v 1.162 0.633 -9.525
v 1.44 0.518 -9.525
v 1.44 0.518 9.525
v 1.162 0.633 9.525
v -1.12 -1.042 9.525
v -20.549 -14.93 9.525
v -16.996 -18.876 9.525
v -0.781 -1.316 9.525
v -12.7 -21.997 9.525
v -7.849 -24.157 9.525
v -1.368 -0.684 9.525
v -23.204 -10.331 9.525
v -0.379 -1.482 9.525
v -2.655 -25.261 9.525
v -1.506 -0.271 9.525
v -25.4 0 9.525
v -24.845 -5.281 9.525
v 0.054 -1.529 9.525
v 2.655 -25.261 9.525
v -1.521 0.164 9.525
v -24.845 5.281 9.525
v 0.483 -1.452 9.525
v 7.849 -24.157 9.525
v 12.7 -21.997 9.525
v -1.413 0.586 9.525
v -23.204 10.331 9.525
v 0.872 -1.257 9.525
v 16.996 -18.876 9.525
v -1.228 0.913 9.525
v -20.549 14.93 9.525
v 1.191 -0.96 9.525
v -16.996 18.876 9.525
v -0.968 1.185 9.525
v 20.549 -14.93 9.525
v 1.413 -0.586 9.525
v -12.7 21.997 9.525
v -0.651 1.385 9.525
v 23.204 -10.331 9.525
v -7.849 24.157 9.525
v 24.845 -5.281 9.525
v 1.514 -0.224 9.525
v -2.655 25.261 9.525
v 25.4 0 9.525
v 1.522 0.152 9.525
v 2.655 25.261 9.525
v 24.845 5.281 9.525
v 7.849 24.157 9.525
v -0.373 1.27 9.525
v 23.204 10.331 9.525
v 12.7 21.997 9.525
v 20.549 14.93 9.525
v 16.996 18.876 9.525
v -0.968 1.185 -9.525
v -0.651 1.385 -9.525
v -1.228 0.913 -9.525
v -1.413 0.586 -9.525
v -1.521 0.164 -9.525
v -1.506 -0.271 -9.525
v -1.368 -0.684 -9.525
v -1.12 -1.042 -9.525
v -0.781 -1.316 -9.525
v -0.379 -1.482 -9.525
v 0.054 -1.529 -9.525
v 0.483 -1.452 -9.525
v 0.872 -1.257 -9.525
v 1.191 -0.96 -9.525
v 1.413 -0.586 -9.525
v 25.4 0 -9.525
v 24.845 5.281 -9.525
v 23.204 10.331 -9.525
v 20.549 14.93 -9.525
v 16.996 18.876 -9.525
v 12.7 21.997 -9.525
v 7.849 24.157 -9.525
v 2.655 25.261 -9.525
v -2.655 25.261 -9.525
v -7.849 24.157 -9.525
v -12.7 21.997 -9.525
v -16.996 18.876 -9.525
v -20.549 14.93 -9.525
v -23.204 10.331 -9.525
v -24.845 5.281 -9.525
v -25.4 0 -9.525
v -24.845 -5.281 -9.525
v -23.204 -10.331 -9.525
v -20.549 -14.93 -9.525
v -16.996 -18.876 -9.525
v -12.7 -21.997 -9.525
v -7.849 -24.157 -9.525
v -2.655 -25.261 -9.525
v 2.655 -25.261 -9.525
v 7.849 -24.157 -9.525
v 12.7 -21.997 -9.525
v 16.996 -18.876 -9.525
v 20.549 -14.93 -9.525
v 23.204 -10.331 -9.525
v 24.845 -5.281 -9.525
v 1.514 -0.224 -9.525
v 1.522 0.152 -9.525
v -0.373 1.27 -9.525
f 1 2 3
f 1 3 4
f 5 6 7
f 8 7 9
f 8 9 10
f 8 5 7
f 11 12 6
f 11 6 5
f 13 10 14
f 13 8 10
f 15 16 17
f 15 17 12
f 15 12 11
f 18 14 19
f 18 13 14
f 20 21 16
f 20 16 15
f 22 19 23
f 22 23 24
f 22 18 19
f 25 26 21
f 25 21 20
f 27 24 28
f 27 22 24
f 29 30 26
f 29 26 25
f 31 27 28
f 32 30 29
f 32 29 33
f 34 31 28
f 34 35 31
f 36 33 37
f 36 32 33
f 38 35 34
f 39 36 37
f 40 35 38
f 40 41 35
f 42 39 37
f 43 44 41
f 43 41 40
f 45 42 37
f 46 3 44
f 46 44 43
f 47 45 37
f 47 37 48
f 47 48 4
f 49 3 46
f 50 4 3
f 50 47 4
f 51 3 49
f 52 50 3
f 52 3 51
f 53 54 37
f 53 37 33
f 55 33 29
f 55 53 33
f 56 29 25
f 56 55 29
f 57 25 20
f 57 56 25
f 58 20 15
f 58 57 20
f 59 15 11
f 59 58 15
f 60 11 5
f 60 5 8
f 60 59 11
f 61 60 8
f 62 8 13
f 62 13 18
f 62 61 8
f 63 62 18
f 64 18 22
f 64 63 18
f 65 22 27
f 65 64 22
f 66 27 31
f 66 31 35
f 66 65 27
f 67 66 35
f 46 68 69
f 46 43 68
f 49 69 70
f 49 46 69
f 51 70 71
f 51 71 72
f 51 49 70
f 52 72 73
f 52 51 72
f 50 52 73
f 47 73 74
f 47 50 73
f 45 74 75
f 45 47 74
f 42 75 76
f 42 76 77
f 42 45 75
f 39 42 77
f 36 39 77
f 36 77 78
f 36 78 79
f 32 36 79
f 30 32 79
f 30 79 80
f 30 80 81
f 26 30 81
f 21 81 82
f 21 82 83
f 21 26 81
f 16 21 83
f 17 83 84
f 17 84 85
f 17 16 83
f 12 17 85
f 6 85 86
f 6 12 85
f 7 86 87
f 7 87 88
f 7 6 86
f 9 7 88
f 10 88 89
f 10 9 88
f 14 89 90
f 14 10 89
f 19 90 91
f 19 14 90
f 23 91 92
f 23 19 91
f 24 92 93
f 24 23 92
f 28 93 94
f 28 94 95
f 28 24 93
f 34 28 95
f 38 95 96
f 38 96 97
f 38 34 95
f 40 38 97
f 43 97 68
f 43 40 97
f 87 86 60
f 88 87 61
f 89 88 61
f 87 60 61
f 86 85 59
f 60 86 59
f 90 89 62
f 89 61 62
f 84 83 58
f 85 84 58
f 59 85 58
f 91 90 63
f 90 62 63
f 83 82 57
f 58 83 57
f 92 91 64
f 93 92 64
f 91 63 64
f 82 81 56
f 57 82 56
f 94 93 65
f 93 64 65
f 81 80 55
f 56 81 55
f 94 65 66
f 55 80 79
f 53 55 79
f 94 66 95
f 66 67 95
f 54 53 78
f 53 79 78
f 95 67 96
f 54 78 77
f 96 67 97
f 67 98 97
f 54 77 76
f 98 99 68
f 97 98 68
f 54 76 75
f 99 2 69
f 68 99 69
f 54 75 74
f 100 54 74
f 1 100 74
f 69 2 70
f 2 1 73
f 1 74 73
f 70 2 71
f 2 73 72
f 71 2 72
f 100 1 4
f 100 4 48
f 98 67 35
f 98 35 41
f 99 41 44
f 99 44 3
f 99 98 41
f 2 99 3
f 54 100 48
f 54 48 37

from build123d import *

# Parameters (mm, degrees)
SKETCH1_R           = 25.4
BOSS_EXTRUDE1_DEPTH = 9.525


with BuildPart() as part:
    # Sketch1 → Boss-Extrude1 (new, symmetric)
    with BuildSketch(Plane.XY):
        Circle(SKETCH1_R)
        with BuildLine():
            Line((1.439619435, 0.51806938), (1.161846601, 0.633255459))
            Line((1.161846601, 0.633255459), (-0.372765644, 1.269624265))
            Line((-0.372765644, 1.269624265), (-0.650538478, 1.384810344))
            ThreePointArc((-0.650538478, 1.384810344), (-1.106507953, 1.056664634), (-1.413303873, 0.586064982))
            ThreePointArc((-1.413303873, 0.586064982), (-0.586064982, -1.413303873), (1.413303873, -0.586064982))
            ThreePointArc((1.413303873, -0.586064982), (1.529565632, -0.036455146), (1.439619435, 0.51806938))
        make_face(mode=Mode.SUBTRACT)
    extrude(amount=BOSS_EXTRUDE1_DEPTH, both=True)


solid = part.part
